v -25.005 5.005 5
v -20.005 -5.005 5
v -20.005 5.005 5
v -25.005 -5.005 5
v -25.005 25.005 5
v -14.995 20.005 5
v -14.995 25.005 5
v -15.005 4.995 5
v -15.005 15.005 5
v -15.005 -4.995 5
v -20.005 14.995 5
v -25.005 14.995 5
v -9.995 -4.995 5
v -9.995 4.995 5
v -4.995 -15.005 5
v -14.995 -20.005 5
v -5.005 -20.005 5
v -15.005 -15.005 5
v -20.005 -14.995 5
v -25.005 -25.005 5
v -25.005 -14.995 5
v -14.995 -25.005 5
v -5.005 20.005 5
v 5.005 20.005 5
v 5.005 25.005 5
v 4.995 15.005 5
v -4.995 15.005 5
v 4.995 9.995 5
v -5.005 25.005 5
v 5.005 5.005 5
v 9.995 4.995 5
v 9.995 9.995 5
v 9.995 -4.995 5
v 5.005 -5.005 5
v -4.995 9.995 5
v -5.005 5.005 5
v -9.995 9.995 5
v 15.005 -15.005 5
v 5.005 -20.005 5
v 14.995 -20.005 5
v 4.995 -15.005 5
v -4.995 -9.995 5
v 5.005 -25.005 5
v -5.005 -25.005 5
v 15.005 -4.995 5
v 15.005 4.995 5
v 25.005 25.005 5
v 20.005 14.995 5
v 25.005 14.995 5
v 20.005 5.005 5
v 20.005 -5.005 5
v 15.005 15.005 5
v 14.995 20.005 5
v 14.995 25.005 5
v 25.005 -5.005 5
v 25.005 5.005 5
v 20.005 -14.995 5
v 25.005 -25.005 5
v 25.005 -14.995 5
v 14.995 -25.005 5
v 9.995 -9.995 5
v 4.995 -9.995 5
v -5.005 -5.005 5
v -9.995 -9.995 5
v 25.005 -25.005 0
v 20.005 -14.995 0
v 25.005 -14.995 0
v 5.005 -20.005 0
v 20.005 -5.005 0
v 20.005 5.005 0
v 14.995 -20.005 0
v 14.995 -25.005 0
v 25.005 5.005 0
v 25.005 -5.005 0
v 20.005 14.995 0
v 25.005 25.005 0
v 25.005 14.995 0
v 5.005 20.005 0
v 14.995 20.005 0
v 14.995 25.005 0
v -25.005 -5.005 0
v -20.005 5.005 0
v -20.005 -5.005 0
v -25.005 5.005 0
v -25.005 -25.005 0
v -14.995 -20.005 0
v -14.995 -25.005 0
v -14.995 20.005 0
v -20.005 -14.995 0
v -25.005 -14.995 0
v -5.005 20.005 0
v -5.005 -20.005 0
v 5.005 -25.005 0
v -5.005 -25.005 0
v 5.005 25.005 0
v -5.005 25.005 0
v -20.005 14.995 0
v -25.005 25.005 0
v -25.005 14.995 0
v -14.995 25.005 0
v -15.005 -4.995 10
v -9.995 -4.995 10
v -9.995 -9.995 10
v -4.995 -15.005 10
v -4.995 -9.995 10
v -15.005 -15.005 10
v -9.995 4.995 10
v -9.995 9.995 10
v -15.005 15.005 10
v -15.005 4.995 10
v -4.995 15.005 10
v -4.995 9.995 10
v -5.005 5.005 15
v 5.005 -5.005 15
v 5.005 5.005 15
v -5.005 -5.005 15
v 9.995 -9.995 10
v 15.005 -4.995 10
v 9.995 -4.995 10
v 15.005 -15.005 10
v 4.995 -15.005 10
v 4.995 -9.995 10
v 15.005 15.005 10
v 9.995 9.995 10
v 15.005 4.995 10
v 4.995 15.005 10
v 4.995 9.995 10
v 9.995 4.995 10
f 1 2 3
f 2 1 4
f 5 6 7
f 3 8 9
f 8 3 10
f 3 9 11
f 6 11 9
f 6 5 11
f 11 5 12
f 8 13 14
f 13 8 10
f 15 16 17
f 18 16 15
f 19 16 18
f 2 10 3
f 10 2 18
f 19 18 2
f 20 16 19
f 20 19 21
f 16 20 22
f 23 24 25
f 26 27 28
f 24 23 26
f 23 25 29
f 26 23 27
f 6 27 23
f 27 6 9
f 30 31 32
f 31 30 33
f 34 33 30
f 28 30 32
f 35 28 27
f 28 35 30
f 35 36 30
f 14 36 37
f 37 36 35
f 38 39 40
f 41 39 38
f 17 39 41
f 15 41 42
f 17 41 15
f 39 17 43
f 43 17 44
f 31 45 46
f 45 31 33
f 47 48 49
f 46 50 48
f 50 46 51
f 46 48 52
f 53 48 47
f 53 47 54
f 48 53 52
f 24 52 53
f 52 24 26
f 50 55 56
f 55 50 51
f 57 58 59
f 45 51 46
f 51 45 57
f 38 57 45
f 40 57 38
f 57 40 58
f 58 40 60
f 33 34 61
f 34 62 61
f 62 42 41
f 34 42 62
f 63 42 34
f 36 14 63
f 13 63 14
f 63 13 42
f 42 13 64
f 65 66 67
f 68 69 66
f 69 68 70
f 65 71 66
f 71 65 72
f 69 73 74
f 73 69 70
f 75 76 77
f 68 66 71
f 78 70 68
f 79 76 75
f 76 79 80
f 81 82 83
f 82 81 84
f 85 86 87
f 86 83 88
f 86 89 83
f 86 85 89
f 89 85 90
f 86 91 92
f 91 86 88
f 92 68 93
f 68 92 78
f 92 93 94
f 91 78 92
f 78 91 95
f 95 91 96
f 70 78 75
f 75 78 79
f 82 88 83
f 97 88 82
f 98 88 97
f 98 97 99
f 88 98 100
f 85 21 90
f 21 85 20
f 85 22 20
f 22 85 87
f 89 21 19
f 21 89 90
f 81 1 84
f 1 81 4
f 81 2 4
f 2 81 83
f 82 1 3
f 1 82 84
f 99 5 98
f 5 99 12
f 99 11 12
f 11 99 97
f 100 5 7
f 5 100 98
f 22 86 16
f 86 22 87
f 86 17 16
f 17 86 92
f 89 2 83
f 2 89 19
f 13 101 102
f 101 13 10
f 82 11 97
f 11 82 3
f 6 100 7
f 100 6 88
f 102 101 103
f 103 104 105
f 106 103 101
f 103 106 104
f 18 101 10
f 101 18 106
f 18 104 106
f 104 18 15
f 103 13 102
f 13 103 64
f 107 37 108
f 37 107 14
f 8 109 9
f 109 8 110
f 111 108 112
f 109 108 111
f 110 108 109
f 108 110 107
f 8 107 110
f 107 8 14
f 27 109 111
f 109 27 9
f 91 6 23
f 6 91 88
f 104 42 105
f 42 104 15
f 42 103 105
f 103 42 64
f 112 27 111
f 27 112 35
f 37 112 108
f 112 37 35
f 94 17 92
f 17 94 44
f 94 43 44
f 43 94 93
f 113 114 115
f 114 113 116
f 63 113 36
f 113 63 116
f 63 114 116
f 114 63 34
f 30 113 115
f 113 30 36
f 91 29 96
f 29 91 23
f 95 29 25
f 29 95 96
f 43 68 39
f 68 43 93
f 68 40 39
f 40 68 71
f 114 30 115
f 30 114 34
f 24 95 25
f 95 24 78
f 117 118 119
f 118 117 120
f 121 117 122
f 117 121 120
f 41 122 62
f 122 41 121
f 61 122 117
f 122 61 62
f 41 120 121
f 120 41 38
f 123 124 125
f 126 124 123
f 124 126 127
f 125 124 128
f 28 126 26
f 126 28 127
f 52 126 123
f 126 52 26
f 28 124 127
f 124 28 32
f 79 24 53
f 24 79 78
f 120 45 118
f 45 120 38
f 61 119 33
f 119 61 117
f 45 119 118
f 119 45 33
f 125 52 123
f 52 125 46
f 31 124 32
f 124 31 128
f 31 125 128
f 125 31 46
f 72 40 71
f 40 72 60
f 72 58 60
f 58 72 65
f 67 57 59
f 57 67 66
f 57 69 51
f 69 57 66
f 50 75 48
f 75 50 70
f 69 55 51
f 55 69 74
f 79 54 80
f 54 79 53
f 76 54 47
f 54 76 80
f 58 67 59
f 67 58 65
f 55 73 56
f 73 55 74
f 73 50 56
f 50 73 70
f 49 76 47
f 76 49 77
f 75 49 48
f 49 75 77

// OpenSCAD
/*
Height Map Example
Tony Buser <tbuser@gmail.com>
http://tonybuser.com
http://creativecommons.org/licenses/by/3.0/

Can also dynamically run this by passing an array on the command line:

/Applications/OpenSCAD.app/Contents/MacOS/OpenSCAD -m make -D bitmap=[2,2,2,0,1,3,2,2,2] -D row_size=3 -s height_map.stl height_map.scad
*/

include <bitmap.scad>

block_size = 5;
height = 5;

row_size = 10; // 10x10 pixels
bitmap = [
	1,1,0,0,1,1,0,0,1,1,
	1,1,1,1,1,1,1,1,1,1,
	0,1,2,2,1,1,2,2,1,0,
	0,1,2,1,1,1,1,2,1,0,
	1,1,1,1,3,3,1,1,1,1,
	1,1,1,1,3,3,1,1,1,1,
	0,1,2,1,1,1,1,2,1,0,
	0,1,2,2,1,1,2,2,1,0,
	1,1,1,1,1,1,1,1,1,1,
	1,1,0,0,1,1,0,0,1,1
];

bitmap(bitmap, block_size, height, row_size);
